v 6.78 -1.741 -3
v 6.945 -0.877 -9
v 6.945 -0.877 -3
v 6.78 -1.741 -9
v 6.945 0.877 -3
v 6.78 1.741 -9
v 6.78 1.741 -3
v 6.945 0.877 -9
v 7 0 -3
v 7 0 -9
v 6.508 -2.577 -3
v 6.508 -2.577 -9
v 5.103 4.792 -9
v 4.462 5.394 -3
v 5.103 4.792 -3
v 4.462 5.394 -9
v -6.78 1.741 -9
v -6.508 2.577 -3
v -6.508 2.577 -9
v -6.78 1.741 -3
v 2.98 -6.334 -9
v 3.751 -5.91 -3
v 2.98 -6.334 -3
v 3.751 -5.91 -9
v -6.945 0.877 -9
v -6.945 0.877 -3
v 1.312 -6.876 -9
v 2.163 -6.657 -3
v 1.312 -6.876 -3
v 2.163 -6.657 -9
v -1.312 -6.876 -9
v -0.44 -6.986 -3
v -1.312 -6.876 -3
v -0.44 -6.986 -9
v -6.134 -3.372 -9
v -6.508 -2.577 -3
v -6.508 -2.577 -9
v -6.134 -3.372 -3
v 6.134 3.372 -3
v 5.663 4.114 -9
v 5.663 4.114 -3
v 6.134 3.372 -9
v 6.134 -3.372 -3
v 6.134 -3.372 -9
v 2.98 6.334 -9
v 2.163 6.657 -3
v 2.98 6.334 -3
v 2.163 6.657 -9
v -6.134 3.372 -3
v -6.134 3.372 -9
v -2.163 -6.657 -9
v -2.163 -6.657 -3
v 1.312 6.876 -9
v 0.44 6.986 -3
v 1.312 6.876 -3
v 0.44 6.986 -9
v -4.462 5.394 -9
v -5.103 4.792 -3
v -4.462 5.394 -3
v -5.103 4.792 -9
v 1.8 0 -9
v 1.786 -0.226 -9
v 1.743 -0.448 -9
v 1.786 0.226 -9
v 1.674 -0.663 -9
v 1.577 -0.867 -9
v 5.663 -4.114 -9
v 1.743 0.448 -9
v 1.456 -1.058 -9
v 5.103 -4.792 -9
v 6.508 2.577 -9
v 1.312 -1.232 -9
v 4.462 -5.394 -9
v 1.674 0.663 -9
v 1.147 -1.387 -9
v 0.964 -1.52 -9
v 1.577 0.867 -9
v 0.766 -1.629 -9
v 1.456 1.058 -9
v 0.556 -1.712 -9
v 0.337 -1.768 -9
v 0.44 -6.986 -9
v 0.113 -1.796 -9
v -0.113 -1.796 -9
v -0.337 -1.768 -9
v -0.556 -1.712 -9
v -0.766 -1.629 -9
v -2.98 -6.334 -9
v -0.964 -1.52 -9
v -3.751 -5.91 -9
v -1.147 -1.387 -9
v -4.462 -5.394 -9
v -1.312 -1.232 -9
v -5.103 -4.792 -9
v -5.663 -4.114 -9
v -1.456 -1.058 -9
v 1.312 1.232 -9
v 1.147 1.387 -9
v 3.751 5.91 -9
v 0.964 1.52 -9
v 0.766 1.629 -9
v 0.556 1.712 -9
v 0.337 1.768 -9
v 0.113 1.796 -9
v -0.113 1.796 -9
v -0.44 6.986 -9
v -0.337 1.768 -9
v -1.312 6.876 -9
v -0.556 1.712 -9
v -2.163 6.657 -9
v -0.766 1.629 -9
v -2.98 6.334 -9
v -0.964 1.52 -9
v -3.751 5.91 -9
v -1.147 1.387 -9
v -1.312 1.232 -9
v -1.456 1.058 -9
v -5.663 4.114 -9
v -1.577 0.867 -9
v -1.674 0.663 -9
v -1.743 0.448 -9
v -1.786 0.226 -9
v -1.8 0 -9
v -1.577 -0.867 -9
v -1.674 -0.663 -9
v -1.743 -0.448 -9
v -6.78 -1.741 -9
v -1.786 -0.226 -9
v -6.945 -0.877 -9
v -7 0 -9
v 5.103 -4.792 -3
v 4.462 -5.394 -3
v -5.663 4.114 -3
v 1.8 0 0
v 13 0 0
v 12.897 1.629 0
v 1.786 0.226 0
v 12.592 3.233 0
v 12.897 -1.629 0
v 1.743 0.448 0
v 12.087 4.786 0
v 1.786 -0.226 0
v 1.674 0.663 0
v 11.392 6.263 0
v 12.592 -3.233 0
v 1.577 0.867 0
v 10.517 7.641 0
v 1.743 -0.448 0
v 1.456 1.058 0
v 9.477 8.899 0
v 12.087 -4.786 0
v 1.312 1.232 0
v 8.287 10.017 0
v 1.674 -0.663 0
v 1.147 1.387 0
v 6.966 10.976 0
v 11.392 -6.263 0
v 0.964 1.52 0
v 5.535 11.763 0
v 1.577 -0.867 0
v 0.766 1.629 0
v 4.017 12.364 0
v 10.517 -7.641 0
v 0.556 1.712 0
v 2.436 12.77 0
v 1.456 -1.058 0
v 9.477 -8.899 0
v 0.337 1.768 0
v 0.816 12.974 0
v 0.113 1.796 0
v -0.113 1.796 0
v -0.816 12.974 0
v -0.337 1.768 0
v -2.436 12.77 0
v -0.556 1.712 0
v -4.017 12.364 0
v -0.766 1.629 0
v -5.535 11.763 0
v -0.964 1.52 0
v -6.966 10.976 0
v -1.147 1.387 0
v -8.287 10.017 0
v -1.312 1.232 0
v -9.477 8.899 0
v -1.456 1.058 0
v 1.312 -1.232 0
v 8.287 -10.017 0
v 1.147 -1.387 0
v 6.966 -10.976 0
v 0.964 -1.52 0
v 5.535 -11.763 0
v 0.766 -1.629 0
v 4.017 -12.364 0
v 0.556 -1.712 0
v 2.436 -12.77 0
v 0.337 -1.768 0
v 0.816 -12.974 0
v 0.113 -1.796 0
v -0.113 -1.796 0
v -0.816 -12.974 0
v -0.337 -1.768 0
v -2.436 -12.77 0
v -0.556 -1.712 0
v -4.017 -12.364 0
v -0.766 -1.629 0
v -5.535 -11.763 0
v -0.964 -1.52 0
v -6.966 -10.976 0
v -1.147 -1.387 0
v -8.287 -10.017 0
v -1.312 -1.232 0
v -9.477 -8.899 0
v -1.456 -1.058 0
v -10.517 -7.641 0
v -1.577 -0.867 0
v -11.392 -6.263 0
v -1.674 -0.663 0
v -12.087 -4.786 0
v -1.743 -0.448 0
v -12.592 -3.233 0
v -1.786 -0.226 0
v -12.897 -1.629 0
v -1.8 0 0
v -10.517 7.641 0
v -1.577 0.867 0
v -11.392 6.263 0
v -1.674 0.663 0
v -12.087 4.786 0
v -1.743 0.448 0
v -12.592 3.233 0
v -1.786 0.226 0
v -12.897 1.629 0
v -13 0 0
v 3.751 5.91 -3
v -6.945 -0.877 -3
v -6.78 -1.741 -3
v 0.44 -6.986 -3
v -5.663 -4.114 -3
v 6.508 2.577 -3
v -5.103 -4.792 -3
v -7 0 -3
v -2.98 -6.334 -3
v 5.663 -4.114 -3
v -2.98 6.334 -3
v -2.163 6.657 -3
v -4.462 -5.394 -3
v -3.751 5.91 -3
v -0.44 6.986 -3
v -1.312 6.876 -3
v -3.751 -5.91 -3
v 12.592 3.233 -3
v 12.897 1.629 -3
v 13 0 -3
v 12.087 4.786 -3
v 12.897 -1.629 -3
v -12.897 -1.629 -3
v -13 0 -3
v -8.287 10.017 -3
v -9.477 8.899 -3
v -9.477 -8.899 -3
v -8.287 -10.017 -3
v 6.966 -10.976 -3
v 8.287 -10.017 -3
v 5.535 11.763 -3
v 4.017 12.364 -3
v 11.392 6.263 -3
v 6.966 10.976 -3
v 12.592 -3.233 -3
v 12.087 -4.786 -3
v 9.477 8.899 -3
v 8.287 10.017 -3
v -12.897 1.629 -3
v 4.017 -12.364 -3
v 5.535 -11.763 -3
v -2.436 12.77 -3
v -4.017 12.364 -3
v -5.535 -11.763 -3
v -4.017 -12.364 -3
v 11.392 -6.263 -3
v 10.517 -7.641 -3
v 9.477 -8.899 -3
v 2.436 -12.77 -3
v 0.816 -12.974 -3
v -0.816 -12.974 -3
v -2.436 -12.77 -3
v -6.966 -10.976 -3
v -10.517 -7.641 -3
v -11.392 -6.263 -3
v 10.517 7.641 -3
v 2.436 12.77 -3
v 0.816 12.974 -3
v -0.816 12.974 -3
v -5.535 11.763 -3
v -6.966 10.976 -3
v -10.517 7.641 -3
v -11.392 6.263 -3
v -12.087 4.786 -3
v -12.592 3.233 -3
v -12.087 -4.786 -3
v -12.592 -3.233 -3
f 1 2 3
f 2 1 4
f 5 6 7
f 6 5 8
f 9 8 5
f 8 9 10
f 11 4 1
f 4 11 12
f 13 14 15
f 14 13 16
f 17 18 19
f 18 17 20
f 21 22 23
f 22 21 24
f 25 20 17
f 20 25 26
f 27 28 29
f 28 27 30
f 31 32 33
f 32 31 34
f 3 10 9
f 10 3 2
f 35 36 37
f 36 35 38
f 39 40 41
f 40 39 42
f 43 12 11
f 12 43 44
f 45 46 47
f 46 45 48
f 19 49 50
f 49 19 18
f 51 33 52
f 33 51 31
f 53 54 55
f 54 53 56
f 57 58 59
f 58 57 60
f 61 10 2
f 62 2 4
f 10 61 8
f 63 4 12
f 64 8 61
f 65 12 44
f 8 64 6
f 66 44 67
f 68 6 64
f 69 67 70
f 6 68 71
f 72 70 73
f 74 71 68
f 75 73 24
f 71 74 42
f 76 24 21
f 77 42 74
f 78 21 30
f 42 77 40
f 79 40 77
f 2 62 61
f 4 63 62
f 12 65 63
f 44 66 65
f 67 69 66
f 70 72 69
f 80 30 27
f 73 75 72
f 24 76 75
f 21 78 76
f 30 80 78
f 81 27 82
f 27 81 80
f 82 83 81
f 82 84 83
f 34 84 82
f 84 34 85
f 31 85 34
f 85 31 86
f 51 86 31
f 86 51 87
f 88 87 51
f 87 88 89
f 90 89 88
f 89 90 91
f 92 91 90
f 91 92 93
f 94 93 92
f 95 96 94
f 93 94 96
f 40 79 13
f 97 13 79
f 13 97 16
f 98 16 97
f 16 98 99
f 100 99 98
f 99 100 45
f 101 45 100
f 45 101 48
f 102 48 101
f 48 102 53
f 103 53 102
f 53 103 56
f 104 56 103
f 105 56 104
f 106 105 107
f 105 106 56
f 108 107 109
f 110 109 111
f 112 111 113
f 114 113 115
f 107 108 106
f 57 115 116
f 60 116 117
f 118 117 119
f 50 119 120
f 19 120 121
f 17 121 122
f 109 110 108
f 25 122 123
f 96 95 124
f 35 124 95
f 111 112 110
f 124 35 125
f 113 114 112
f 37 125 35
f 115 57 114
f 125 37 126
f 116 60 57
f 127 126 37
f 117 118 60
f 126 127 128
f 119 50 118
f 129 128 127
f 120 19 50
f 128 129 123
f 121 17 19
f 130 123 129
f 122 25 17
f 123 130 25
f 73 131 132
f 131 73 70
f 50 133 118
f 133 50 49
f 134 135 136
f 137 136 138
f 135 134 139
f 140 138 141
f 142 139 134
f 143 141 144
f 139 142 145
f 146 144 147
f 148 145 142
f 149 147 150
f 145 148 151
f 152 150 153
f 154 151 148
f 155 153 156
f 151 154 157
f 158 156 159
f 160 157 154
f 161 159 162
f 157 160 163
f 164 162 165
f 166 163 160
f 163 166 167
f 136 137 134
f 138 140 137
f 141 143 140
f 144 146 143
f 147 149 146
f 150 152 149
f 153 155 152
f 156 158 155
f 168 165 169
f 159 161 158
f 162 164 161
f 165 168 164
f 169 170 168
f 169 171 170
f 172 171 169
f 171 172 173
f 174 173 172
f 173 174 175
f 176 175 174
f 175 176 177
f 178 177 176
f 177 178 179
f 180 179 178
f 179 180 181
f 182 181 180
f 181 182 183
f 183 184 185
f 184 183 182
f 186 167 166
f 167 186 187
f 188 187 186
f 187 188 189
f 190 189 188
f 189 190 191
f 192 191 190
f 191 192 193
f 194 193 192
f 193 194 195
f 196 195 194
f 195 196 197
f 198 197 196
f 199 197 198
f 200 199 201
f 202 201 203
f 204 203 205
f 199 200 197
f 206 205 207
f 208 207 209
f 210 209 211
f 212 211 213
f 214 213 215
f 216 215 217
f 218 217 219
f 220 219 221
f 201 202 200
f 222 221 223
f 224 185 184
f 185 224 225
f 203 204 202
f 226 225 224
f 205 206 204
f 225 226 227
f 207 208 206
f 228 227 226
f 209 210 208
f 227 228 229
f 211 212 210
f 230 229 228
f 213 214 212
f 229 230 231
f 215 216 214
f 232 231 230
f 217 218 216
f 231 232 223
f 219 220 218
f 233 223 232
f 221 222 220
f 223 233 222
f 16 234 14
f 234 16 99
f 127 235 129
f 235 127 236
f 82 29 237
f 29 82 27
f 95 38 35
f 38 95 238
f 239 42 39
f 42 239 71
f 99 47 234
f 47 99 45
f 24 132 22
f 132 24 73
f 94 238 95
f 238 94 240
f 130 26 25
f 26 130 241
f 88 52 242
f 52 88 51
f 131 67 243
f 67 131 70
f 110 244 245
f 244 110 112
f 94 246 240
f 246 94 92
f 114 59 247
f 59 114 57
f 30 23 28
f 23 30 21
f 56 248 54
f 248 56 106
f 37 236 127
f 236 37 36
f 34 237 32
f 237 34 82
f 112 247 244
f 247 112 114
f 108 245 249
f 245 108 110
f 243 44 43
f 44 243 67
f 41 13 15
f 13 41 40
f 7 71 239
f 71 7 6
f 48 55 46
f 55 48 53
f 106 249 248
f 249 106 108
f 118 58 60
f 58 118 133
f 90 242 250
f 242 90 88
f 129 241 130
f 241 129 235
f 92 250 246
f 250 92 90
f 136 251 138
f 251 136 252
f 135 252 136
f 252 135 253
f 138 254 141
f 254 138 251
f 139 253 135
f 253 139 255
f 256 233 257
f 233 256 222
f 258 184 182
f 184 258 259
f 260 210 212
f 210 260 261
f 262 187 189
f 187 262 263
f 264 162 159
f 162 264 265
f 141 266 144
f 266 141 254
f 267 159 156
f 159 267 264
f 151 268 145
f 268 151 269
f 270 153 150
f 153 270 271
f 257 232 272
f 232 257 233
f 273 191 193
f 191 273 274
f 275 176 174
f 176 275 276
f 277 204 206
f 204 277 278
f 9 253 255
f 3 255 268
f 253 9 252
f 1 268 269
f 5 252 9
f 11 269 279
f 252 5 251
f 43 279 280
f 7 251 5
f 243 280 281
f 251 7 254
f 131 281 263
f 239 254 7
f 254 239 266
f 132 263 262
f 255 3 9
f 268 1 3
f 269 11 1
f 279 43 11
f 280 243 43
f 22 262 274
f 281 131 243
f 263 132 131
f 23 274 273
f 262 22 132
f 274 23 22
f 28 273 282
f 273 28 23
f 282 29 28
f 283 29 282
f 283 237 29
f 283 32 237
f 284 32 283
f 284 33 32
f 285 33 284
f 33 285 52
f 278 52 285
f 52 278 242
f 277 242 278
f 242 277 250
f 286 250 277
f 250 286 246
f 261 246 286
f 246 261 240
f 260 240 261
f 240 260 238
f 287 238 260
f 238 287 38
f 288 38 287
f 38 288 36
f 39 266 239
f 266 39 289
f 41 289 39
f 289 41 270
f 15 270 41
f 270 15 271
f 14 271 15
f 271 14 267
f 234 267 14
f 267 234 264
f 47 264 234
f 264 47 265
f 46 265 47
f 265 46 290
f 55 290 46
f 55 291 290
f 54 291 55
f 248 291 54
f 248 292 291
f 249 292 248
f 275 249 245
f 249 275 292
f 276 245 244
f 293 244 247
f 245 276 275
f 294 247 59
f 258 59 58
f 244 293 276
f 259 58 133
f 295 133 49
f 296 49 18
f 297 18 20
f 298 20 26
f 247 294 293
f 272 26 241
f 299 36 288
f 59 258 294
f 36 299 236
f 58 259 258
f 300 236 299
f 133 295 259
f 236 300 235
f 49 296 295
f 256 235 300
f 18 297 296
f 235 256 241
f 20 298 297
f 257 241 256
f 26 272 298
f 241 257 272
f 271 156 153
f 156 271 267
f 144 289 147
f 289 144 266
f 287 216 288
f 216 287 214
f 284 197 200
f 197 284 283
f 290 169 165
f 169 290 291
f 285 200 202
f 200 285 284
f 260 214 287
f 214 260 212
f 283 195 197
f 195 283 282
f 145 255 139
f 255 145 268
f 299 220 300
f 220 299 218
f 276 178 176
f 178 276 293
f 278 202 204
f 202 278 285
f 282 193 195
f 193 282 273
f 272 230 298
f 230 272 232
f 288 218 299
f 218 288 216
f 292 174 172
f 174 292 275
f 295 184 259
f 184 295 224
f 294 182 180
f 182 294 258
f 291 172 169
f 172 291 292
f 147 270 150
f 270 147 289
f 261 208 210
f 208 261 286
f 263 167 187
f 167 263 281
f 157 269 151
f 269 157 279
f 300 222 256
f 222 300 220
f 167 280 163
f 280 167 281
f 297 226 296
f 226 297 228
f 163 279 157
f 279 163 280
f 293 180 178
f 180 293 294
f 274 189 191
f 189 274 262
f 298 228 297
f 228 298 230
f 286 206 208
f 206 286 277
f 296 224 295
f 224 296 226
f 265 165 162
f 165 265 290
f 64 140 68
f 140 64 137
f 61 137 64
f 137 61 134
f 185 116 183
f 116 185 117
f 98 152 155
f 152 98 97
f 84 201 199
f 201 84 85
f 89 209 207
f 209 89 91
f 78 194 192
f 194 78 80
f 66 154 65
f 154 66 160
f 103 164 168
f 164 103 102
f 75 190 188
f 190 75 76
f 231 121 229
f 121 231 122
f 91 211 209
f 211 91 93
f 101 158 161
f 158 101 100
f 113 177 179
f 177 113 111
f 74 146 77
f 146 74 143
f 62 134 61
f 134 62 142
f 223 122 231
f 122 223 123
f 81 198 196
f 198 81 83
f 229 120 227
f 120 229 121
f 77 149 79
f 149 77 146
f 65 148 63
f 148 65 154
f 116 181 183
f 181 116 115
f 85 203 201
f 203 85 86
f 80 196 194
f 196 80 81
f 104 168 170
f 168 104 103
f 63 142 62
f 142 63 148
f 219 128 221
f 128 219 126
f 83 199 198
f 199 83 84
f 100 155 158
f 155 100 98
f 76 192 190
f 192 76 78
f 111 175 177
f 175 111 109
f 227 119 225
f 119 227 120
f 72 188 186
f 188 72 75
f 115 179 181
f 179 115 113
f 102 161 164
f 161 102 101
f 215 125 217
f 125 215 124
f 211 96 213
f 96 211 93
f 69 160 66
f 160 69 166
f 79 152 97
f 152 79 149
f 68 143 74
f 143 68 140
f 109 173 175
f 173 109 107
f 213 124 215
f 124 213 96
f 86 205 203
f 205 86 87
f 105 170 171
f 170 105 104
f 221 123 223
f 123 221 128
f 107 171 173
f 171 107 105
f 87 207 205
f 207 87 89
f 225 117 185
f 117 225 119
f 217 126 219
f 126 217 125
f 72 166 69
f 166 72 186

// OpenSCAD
$fn = 50;


difference() {
	union() {
		translate(v = [0, 0, -9.0000000000]) {
			cylinder(h = 9, r = 7.0000000000);
		}
		translate(v = [0, 0, -3.0000000000]) {
			cylinder(h = 3, r = 13.0000000000);
		}
	}
	union() {
		#translate(v = [0, 0, -9]) {
			cylinder(h = 9, r = 1.8000000000);
		}
	}
}
